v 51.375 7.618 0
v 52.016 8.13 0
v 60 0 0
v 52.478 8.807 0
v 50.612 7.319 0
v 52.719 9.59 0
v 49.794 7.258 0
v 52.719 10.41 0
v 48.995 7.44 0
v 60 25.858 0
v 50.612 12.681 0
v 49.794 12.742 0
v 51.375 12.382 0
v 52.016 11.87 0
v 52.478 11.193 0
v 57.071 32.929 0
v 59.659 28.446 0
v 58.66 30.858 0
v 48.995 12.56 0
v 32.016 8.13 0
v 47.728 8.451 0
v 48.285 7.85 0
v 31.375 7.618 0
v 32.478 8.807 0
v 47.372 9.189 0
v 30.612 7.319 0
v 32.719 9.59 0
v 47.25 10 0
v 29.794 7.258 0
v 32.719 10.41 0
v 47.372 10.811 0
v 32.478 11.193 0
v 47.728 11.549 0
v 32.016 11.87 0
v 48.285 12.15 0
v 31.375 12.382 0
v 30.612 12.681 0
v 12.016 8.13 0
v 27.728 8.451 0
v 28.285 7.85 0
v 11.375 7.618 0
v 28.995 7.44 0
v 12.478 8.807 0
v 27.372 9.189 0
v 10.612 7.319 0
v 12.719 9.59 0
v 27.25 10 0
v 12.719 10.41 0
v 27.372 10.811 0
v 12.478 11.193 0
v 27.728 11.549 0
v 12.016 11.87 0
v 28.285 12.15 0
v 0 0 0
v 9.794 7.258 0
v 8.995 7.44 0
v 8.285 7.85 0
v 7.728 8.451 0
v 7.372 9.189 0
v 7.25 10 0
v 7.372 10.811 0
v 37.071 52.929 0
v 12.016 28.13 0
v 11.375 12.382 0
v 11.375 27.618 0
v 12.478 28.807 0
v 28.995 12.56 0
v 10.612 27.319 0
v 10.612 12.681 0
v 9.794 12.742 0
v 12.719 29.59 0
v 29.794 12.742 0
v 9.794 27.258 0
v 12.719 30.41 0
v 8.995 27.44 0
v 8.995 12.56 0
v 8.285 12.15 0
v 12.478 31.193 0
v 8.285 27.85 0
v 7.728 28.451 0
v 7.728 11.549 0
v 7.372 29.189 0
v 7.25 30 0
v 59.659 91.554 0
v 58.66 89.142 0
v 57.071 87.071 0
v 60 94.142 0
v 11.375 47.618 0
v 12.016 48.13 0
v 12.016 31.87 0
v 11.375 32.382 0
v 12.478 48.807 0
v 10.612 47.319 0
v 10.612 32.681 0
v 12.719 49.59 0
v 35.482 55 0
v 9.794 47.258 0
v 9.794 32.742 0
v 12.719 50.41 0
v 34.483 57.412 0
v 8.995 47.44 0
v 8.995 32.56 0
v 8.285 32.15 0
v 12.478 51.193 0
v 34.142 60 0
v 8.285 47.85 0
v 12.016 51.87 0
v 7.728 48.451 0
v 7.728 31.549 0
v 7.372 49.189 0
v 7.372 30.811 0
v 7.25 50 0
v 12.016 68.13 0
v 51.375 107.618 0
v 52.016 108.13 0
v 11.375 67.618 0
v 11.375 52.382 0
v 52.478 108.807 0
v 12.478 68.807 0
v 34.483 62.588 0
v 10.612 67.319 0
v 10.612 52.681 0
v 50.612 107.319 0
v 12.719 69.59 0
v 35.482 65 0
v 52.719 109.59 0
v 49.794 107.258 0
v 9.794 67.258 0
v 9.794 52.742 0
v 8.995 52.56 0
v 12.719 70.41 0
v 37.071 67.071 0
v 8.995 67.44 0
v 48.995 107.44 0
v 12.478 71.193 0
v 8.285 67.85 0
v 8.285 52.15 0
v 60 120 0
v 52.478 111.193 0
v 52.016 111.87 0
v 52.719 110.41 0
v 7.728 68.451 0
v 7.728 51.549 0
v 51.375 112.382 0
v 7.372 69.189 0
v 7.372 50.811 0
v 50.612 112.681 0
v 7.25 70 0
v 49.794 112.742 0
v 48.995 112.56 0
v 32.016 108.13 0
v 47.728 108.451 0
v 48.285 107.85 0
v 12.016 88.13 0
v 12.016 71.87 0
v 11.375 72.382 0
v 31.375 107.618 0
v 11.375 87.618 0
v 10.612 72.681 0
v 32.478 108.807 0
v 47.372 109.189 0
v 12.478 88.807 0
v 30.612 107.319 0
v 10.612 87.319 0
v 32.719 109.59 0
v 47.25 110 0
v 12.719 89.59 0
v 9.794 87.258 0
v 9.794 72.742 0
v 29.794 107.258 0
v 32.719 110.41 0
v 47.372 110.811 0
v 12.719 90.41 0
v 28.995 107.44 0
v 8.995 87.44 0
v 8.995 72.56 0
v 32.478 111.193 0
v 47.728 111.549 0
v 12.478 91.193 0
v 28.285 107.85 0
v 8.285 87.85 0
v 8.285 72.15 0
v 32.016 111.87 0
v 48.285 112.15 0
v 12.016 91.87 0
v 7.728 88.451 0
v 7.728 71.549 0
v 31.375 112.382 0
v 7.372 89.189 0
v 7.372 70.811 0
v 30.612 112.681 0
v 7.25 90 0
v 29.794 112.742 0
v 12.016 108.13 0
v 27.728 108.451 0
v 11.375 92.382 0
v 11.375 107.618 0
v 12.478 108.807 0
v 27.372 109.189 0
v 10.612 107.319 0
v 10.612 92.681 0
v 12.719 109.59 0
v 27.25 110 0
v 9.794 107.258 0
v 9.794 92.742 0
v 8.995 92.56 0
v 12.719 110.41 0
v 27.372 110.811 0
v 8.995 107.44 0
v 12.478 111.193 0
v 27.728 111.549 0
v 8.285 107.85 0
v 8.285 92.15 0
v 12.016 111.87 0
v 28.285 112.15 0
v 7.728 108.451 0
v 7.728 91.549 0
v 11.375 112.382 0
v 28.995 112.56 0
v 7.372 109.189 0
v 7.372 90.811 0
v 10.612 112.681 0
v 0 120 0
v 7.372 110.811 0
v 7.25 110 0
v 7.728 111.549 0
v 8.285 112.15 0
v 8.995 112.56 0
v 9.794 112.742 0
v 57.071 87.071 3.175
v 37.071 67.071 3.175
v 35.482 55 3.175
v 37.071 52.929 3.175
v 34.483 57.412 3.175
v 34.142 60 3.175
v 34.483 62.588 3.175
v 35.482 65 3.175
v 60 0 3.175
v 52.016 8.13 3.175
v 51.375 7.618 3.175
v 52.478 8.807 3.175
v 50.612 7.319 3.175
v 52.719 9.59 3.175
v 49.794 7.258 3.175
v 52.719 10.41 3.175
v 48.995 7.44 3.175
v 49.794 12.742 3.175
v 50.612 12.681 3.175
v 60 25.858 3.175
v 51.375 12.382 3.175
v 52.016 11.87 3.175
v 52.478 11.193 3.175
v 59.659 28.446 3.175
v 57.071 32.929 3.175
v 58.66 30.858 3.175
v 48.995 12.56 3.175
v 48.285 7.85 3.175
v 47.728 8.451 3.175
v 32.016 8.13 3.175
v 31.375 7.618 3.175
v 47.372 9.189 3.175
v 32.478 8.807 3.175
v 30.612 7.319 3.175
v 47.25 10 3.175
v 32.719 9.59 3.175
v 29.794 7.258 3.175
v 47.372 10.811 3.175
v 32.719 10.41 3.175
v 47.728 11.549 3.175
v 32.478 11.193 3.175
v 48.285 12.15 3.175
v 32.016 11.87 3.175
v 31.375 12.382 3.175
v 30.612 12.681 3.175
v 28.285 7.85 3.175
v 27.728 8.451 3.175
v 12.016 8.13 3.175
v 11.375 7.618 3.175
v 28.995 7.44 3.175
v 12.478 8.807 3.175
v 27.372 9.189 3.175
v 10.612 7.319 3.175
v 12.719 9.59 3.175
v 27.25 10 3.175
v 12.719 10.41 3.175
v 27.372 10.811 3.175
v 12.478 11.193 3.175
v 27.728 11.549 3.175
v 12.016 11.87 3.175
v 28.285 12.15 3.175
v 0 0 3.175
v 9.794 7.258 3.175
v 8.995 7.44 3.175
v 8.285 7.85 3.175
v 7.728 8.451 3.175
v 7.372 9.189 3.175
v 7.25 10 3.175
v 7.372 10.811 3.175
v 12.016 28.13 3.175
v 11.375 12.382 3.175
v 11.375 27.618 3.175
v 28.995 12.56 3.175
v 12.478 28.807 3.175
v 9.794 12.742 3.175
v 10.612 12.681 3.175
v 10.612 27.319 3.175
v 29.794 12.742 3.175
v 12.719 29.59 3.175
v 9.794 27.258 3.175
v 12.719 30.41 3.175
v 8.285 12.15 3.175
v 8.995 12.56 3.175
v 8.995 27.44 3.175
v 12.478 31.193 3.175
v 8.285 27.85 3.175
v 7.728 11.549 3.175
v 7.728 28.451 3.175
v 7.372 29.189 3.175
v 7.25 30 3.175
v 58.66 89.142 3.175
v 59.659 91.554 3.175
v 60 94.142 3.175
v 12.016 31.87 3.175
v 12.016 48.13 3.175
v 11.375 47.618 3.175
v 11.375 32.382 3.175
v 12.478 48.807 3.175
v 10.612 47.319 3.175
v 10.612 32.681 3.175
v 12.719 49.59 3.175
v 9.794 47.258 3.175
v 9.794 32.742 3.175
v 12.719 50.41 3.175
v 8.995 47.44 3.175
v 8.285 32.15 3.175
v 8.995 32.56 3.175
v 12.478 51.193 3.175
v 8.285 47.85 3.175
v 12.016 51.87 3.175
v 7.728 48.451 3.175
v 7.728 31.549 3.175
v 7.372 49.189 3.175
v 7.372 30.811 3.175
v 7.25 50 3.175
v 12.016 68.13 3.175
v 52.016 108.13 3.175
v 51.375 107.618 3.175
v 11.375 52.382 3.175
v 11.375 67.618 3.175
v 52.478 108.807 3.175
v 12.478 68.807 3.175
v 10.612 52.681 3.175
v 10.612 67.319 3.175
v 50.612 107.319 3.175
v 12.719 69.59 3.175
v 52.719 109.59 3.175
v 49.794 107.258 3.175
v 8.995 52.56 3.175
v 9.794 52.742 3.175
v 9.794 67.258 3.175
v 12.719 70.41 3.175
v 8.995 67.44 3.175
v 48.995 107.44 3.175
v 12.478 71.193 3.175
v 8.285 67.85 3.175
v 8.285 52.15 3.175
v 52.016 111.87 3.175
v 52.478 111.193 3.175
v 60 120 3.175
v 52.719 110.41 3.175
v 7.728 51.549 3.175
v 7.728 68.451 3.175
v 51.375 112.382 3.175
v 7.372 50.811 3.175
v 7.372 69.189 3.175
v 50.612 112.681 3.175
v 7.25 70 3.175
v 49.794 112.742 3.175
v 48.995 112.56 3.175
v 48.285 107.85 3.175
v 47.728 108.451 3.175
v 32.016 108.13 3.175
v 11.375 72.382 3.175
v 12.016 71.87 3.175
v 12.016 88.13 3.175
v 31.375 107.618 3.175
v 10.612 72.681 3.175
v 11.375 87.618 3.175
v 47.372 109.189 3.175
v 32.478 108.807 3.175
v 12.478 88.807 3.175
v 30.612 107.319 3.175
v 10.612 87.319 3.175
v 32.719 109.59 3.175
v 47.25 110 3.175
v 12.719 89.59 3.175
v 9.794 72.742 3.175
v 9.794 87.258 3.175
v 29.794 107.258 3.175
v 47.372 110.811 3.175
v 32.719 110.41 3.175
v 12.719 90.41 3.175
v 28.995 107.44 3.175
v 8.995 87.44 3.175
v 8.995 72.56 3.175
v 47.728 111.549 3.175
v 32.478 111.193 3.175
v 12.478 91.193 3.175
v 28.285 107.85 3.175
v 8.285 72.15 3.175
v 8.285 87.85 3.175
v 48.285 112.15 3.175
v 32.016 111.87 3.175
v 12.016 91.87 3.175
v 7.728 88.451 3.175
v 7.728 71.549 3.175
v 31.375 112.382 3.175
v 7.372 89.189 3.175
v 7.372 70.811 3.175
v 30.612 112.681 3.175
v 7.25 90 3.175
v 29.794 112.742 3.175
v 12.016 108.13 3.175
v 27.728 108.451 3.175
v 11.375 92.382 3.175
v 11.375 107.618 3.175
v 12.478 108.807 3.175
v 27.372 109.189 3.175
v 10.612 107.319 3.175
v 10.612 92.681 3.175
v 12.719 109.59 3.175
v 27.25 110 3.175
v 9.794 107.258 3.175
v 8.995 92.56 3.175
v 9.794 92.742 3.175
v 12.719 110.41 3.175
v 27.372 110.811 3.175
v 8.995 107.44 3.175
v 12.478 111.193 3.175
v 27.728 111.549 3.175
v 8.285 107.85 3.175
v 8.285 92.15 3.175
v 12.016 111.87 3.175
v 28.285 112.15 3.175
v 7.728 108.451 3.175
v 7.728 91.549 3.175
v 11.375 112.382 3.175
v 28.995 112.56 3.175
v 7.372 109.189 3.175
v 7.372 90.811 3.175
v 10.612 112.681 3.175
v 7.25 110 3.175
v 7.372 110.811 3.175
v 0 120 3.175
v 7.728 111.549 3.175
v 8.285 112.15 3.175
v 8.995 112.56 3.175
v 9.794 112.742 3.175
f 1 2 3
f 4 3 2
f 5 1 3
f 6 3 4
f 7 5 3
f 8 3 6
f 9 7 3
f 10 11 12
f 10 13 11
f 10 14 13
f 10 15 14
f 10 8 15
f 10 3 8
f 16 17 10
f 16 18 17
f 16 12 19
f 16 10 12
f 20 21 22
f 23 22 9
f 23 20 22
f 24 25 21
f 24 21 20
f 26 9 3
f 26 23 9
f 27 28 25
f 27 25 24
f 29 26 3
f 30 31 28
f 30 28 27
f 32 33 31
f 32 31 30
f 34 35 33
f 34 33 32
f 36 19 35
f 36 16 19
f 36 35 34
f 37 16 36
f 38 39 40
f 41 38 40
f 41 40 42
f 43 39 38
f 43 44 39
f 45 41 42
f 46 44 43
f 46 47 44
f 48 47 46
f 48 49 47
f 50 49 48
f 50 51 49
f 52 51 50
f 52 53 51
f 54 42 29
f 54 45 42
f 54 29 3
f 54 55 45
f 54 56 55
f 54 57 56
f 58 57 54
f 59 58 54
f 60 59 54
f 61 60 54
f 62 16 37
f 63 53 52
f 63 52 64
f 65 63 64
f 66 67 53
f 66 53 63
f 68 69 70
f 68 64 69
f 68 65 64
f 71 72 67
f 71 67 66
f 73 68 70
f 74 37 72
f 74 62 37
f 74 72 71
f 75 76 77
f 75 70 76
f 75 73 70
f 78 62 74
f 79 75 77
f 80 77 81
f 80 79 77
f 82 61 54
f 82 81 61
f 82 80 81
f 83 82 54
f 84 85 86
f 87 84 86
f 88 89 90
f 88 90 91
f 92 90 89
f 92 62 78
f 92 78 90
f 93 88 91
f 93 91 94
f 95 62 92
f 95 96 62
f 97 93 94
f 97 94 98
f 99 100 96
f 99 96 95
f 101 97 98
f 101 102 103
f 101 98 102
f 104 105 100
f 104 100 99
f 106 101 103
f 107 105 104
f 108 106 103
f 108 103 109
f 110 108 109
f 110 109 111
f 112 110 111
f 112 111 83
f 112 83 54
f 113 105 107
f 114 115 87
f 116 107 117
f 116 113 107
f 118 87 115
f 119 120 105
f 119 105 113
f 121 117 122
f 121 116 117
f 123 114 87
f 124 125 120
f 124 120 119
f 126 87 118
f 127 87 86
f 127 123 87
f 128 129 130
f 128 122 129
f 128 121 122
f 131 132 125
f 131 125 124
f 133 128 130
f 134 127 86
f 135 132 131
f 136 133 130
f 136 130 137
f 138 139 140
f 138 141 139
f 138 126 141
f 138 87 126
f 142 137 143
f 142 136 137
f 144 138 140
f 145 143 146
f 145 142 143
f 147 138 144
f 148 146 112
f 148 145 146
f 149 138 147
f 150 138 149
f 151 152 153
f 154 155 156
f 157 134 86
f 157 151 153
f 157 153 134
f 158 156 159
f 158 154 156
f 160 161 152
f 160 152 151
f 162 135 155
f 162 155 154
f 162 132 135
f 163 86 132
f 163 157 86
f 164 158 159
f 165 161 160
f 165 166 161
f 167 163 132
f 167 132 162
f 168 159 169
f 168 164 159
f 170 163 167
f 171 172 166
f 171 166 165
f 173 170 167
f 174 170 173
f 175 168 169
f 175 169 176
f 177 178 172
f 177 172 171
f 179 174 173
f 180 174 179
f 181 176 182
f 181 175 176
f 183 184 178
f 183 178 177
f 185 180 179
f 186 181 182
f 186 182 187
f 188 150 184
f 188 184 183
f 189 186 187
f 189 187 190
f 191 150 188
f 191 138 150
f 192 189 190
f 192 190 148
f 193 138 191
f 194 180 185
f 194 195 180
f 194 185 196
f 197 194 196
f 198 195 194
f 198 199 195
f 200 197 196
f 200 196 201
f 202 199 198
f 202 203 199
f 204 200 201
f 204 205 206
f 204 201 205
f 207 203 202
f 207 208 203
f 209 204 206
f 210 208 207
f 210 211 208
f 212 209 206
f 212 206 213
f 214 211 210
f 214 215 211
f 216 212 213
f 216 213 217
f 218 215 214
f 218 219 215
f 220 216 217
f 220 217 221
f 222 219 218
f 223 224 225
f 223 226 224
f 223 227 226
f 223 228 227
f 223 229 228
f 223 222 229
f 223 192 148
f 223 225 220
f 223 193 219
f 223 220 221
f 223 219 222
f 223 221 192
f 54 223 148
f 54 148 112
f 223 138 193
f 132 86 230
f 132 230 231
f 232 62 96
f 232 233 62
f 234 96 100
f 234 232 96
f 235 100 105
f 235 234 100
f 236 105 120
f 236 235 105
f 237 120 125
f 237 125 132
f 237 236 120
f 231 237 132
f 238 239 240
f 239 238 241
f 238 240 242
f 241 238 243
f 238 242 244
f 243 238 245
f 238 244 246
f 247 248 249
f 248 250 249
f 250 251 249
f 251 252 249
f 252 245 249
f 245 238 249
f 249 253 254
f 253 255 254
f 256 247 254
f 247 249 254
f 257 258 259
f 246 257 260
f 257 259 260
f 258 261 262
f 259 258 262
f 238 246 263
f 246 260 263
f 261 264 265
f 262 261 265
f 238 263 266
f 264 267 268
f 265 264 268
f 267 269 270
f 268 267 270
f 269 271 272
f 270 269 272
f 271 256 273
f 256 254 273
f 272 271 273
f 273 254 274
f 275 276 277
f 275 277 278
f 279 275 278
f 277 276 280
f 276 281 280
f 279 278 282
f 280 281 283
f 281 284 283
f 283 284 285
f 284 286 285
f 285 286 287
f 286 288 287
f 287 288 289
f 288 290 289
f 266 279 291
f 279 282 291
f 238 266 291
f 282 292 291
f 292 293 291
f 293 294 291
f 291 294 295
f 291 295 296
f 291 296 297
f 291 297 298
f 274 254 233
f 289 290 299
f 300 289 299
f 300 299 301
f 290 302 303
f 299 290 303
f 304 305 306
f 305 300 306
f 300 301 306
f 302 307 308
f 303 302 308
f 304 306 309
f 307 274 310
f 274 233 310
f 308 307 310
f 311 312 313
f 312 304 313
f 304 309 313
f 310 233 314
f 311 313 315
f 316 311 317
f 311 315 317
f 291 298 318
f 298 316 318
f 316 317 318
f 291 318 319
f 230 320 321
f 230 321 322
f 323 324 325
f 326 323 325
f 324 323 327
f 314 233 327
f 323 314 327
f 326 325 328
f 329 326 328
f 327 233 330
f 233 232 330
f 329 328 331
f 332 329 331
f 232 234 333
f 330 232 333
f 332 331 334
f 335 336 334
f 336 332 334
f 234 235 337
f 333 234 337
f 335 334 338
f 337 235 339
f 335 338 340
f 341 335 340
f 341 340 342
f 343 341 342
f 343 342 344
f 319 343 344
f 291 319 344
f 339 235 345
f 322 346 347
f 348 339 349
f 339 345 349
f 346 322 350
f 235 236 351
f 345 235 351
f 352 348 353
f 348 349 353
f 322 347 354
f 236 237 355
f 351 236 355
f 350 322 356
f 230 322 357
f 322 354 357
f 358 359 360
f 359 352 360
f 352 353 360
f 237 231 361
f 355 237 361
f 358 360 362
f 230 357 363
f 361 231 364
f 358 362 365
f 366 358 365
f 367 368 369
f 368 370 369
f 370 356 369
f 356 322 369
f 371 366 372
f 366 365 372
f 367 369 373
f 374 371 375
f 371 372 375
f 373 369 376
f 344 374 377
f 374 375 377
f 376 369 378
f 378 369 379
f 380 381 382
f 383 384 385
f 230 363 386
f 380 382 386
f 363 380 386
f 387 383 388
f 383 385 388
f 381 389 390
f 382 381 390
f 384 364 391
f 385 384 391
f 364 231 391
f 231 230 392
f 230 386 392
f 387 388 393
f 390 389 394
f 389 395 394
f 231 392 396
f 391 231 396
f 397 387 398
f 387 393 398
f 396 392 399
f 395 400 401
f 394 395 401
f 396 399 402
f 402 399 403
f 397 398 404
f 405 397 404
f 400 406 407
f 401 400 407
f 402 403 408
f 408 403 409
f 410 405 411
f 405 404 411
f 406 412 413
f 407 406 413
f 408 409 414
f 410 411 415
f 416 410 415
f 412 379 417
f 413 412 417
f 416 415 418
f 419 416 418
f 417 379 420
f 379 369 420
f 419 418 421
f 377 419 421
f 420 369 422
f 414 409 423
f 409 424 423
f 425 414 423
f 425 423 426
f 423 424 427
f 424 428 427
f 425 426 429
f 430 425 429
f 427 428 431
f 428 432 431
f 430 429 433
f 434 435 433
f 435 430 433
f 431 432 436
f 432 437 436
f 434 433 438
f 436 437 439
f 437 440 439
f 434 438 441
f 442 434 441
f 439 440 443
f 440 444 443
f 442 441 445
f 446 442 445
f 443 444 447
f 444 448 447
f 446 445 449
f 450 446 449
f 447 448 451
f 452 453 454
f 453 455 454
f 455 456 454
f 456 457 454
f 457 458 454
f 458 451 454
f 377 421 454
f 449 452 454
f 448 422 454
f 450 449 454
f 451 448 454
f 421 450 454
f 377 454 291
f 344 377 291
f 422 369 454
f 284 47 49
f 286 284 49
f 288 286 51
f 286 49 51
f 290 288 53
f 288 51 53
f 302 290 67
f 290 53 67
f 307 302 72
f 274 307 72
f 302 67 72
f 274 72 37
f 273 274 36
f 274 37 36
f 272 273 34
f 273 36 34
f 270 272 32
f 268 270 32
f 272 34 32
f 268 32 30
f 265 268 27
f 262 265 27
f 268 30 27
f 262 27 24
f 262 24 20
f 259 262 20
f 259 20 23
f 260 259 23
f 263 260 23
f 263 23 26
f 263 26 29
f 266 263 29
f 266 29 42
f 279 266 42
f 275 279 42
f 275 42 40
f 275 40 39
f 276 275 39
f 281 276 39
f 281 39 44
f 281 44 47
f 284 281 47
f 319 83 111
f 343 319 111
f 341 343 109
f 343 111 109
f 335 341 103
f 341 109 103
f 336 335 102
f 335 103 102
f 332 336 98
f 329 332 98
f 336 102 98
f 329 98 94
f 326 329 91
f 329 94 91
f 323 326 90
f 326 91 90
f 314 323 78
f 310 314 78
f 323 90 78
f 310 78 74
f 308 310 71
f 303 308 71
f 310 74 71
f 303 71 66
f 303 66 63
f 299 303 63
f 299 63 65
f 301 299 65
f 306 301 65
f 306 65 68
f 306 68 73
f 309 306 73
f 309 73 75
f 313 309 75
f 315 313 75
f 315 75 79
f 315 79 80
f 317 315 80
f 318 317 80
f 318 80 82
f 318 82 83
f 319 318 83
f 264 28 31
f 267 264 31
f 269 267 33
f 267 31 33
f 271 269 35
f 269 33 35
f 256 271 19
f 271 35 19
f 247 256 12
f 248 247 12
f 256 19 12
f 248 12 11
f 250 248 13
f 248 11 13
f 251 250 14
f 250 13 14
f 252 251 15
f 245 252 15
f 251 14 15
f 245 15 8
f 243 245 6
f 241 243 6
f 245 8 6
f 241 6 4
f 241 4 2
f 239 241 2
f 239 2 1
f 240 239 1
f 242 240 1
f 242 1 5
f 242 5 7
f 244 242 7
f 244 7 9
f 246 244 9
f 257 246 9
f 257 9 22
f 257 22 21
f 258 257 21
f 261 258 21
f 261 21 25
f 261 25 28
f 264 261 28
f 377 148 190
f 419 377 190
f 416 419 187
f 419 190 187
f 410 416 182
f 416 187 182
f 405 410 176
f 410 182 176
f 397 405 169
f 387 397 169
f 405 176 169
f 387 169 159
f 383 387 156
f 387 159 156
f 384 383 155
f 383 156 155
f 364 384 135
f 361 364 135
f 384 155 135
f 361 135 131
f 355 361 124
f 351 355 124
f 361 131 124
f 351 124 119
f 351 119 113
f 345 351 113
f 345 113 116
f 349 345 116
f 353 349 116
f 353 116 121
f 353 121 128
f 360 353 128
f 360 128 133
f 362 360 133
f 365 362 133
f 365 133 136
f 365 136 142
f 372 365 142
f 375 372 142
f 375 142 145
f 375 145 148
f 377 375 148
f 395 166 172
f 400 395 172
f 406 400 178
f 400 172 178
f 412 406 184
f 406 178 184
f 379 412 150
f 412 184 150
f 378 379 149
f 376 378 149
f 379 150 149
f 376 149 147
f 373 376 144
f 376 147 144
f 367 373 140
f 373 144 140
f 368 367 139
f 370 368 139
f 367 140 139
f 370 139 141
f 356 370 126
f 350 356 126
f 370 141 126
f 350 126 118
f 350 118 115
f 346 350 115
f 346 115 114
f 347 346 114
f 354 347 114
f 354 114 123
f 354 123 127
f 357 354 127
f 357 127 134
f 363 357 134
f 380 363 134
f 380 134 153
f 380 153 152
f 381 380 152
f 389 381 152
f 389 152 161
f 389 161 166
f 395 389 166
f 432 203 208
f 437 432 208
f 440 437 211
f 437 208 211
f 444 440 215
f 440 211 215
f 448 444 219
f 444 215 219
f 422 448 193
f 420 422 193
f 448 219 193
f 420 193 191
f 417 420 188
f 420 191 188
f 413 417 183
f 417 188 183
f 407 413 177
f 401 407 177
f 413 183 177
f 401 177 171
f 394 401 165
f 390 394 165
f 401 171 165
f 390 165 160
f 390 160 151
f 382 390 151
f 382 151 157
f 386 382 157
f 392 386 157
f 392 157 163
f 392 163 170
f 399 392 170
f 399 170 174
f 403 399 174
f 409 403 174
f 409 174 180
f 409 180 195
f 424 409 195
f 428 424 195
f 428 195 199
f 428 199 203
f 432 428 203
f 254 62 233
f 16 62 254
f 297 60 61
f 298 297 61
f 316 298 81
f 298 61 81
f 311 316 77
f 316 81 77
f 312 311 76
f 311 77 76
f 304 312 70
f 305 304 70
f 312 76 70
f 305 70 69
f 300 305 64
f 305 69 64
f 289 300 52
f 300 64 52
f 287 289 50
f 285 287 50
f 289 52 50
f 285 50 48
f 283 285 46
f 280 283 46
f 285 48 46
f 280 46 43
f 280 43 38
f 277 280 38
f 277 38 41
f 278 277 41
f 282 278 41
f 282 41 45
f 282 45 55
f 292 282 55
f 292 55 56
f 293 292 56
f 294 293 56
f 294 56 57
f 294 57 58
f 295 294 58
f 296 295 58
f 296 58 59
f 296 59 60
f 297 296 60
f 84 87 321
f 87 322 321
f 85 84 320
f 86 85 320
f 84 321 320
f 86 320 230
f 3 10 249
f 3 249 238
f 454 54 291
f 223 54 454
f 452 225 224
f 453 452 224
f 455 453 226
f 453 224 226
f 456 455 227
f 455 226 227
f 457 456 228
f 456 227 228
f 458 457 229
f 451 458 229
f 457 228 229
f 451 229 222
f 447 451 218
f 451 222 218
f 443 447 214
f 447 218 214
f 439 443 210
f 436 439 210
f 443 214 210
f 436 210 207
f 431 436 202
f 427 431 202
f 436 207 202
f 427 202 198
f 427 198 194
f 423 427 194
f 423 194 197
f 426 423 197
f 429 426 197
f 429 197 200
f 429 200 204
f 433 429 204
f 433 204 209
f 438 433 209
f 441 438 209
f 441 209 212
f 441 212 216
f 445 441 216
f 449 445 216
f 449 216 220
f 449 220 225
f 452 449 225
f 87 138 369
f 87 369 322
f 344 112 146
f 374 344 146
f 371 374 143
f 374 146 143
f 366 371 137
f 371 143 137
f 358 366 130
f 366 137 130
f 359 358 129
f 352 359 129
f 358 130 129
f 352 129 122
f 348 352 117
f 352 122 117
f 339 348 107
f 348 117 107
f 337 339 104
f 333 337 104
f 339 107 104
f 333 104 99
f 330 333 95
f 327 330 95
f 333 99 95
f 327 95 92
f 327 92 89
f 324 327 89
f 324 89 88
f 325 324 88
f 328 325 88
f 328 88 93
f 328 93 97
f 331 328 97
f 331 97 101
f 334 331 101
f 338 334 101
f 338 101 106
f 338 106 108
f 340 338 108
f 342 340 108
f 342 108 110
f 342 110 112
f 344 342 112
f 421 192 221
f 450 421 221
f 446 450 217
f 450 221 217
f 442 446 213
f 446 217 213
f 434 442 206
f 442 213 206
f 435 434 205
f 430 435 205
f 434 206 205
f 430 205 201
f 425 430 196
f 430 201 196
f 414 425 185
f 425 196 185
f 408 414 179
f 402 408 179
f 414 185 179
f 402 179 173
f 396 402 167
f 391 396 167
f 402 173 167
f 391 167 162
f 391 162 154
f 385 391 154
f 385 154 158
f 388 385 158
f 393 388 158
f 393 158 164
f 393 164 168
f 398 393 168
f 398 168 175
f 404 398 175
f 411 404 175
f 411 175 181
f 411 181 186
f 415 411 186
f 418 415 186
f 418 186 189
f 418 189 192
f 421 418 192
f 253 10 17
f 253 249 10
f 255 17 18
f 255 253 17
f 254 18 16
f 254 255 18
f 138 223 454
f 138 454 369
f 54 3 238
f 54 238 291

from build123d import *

# Parameters (mm, degrees)
BOSS_EXTRUDE1_DEPTH  = 3.175
M5_CLEARANCE_HOLE1_D = 5.5
LPATTERN1_COUNT      = 3
LPATTERN1_PITCH      = 20
LPATTERN2_COUNT      = 6
LPATTERN2_PITCH      = 20
FILLET2_R            = 10
LPATTERN3_COPY_1_D   = 5.5
LPATTERN3_COPY_2_D   = 5.5
LPATTERN3_COPY_3_D   = 5.5


with BuildPart() as part:
    # Sketch1 → Boss-Extrude1 (new body)
    with BuildSketch(Plane.XY):
        Polygon((0, 0), (0, 120), (60, 120), (60, 90), (30, 60), (60, 30), (60, 0), align=None)
    extrude(amount=BOSS_EXTRUDE1_DEPTH)

    # M5 Clearance Hole1 (through all)
    with Locations(Plane(origin=(10, 10, 3.175), x_dir=(1, 0, 0), z_dir=(0, 0, 1))):
        with Locations((0, 0)):
            m5_clearance_hole1 = Hole(M5_CLEARANCE_HOLE1_D / 2)

    # LPattern1: M5 Clearance Hole1 ×3
    with Locations(*[(i * LPATTERN1_PITCH, 0, 0) for i in range(1, LPATTERN1_COUNT)]):
        add(m5_clearance_hole1, mode=Mode.SUBTRACT)

    # LPattern2: M5 Clearance Hole1 ×6
    with Locations(*[(0, i * LPATTERN2_PITCH, 0) for i in range(1, LPATTERN2_COUNT)]):
        add(m5_clearance_hole1, mode=Mode.SUBTRACT)

    # Fillet2
    fillet2_edges = [part.edges().sort_by_distance(p)[0] for p in [
        (60, 90, 1.5875),
        (30, 60, 1.5875),
        (60, 30, 1.5875),
    ]]
    fillet(fillet2_edges, radius=FILLET2_R)

    # LPattern3 copy 1 (through all)
    with Locations(Plane(origin=(30, 110, 3.175), x_dir=(1, 0, 0), z_dir=(0, 0, 1))):
        with Locations((0, 0)):
            Hole(LPATTERN3_COPY_1_D / 2)

    # LPattern3 copy 2 (through all)
    with Locations(Plane(origin=(50, 110, 3.175), x_dir=(1, 0, 0), z_dir=(0, 0, 1))):
        with Locations((0, 0)):
            Hole(LPATTERN3_COPY_2_D / 2)

    # LPattern3 copy 3 (through all)
    with Locations(Plane(origin=(10, 110, 3.175), x_dir=(1, 0, 0), z_dir=(0, 0, 1))):
        with Locations((0, 0)):
            Hole(LPATTERN3_COPY_3_D / 2)


solid = part.part
